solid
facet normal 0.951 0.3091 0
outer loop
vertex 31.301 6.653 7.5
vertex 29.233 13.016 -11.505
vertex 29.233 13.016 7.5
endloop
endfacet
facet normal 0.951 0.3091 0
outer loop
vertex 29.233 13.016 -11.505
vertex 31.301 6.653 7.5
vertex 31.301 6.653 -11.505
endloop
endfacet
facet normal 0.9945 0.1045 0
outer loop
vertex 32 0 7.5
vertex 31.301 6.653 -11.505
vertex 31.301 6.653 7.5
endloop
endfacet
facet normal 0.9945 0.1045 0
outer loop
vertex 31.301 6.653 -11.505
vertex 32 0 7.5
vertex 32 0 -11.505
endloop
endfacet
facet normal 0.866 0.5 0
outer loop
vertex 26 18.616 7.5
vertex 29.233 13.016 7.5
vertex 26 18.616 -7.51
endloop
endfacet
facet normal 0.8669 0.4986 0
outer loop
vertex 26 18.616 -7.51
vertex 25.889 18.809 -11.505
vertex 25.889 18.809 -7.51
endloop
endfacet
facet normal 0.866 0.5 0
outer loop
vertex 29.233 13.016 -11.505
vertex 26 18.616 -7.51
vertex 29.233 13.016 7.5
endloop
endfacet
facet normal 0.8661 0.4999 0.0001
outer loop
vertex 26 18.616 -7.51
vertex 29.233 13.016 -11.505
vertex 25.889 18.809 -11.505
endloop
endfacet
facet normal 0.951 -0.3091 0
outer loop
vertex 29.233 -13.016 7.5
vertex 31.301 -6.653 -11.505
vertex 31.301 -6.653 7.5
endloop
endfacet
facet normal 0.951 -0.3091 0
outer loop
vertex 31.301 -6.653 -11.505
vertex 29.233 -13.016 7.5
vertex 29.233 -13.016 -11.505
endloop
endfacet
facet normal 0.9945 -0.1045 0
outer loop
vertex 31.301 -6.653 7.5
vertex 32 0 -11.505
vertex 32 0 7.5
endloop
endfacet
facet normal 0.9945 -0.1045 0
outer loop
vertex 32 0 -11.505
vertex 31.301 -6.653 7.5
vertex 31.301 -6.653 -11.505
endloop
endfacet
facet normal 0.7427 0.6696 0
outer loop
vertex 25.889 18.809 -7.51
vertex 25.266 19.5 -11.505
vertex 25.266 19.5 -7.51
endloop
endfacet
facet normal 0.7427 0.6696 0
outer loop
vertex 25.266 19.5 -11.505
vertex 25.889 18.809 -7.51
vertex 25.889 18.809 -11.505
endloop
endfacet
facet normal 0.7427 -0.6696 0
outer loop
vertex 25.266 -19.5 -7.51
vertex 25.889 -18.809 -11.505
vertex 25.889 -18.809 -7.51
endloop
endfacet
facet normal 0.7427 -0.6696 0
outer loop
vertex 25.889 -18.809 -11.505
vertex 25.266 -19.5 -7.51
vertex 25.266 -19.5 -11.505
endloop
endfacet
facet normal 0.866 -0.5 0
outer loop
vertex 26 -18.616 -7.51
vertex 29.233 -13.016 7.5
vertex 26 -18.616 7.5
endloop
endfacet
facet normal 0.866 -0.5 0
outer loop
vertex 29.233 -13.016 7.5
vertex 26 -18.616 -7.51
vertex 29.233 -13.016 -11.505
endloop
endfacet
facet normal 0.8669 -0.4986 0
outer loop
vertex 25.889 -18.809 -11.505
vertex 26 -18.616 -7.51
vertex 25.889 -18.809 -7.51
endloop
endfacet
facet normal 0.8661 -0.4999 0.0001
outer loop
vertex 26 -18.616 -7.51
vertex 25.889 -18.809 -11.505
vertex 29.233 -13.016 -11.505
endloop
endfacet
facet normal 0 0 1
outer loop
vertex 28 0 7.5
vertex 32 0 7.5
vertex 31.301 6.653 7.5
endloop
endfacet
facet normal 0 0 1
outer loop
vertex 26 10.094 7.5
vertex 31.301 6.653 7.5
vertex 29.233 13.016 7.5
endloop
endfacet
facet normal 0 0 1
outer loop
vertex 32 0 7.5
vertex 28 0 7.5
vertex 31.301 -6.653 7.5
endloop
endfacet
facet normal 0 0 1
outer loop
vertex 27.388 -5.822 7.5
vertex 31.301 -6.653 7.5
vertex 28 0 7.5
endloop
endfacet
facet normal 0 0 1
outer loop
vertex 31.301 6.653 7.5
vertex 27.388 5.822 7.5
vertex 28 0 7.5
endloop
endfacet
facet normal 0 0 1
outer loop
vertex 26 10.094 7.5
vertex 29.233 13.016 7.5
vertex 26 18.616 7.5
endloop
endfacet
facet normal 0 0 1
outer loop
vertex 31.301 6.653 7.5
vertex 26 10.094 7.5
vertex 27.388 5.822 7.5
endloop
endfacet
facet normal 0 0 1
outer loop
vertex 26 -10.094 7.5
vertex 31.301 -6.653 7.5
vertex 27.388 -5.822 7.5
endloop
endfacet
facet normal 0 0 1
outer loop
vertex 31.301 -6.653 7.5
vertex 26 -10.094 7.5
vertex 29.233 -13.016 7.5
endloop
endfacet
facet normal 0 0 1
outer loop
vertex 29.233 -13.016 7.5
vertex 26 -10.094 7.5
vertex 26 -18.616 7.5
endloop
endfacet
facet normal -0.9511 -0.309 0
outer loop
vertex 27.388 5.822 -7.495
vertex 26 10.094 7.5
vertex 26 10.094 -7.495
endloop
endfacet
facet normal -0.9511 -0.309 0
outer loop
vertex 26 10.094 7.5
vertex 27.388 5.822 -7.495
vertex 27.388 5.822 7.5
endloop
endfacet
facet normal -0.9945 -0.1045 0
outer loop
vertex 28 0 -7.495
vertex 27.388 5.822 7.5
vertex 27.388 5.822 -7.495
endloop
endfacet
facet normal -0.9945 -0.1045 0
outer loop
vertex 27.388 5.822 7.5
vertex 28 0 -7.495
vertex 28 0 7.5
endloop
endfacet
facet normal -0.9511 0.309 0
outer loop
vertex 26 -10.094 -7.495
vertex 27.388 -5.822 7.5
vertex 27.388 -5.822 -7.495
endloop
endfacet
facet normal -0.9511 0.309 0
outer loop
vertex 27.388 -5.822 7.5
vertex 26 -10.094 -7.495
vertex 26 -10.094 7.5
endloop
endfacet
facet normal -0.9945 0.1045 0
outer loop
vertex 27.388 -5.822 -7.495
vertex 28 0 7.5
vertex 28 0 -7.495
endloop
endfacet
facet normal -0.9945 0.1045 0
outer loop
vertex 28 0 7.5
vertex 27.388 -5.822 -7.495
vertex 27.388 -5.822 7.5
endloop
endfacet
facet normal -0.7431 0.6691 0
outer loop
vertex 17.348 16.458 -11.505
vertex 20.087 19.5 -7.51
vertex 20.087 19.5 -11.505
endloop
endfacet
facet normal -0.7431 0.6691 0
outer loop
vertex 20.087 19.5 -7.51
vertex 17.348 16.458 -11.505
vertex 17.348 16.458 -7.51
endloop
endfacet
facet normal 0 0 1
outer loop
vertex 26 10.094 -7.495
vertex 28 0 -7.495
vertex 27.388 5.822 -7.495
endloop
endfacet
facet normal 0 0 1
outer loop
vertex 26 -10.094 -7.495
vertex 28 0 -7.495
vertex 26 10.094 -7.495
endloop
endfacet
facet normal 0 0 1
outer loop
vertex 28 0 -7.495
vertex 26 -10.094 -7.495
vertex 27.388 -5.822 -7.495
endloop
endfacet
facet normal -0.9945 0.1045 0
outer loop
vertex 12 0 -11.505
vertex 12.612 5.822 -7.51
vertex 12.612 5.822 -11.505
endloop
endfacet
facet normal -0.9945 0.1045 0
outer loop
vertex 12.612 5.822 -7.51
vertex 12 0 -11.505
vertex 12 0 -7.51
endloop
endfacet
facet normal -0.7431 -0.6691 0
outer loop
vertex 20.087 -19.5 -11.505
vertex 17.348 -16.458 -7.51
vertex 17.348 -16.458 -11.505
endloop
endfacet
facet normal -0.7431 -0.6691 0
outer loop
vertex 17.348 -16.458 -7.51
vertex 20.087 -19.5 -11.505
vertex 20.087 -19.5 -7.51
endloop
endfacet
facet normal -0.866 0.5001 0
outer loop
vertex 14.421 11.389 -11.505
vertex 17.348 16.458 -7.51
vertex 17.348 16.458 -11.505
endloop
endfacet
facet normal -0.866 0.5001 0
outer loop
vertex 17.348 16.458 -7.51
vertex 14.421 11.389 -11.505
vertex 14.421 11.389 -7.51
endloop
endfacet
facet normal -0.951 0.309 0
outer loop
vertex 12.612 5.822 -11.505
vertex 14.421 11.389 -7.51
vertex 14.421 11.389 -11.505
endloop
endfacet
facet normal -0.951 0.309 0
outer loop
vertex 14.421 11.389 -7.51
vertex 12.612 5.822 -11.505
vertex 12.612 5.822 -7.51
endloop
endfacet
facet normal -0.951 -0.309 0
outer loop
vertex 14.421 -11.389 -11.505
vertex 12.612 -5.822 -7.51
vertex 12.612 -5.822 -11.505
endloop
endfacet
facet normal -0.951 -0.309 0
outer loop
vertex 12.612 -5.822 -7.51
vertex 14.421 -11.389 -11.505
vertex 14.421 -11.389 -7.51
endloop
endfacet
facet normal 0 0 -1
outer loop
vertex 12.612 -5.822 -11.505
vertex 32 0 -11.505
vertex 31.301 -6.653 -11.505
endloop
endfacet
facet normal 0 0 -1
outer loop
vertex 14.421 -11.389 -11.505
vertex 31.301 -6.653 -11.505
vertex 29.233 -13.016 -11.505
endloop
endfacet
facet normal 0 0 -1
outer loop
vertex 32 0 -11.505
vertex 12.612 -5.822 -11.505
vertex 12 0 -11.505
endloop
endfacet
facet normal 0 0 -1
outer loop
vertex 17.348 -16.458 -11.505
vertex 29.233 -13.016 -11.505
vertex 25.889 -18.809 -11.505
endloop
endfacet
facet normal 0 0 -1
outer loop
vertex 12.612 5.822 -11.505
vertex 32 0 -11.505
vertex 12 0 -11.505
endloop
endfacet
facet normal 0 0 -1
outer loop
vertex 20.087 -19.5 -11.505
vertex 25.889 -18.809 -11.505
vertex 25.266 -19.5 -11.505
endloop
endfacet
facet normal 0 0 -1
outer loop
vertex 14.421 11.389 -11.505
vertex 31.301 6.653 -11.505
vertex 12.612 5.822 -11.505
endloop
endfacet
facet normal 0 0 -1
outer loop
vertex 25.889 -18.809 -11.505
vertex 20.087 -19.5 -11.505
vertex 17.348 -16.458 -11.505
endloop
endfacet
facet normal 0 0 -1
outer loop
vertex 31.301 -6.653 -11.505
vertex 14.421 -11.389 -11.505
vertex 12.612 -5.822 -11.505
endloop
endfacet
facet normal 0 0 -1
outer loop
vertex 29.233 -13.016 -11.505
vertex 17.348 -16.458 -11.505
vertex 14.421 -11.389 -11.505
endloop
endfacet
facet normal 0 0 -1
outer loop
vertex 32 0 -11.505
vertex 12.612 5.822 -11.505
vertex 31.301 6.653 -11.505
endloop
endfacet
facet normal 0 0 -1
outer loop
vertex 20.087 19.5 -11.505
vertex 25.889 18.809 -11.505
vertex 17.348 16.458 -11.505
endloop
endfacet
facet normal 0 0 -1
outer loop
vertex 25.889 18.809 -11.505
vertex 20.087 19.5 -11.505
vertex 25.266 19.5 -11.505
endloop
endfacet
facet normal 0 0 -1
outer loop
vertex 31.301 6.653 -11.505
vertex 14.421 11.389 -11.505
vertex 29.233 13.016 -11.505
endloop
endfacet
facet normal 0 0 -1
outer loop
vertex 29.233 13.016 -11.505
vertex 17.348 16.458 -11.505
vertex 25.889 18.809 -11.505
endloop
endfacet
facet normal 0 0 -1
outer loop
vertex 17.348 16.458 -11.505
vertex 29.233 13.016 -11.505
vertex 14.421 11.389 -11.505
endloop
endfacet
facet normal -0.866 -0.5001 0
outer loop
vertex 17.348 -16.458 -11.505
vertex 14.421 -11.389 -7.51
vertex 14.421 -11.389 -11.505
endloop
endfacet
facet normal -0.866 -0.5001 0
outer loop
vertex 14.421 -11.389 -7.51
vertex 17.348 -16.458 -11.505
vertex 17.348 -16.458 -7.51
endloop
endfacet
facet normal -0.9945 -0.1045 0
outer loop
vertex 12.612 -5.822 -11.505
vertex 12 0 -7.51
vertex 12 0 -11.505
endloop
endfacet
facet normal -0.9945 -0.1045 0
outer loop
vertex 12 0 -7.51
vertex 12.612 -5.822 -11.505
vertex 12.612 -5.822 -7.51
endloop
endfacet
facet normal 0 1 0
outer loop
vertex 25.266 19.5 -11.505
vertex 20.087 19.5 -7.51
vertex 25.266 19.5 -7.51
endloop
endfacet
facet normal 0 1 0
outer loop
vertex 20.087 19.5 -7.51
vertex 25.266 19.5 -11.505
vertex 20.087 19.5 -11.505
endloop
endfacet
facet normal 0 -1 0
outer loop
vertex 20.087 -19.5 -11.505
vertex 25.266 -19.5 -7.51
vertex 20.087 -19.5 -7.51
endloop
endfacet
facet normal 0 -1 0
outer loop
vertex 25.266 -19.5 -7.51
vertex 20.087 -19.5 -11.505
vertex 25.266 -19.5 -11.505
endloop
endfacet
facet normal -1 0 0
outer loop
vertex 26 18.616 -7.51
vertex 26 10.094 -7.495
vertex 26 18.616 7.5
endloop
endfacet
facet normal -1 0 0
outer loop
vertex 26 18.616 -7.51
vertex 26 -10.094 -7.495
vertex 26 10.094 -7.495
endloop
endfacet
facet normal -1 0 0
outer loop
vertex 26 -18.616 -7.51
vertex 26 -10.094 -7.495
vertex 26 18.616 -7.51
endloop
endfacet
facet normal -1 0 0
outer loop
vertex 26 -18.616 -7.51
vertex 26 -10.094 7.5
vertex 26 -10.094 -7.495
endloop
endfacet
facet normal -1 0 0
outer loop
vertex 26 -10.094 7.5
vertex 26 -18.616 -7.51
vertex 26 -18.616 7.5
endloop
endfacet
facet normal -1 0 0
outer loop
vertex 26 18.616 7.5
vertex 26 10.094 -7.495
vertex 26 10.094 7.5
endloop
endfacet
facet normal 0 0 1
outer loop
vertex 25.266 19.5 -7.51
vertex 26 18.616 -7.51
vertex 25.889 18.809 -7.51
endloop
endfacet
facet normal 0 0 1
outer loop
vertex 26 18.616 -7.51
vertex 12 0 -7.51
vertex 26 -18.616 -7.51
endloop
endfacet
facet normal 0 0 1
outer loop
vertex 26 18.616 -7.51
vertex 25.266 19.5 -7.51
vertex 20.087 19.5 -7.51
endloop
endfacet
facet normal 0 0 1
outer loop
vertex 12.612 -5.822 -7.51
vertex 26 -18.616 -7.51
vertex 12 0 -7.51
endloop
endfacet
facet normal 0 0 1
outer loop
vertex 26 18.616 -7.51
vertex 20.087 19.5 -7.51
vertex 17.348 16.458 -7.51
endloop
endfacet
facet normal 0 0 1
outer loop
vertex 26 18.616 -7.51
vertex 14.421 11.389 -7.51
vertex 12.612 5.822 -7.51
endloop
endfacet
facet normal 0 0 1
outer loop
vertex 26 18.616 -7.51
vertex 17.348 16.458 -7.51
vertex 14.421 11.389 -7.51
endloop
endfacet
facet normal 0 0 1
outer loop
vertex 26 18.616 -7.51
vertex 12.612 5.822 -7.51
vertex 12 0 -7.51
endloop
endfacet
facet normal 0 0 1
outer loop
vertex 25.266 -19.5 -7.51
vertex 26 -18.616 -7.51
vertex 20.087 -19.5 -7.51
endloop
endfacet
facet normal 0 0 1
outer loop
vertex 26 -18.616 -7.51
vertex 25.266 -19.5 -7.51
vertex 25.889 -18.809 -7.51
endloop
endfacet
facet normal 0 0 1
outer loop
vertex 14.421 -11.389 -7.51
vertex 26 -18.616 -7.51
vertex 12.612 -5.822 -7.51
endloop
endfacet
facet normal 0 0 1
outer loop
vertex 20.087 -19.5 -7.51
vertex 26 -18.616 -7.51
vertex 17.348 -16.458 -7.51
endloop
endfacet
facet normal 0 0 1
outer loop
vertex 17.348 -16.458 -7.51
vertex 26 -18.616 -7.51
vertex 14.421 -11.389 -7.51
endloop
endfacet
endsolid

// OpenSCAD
epsilon=0.01;
t=4;
w=15;
l=35;
d=60;

difference() {
    union() {
        difference() {
            cylinder(d=d+t, h=w, center=true);
            cylinder(d=d-t, h=w+epsilon, center=true);
            }             
        intersection() {
            translate([d*2/3,0,-(w+t)/2])
                cylinder(d=d-t, h=t+epsilon, center=true);
            translate([0,0,-(w+t)/2])
                cylinder(d=d+t, h=t+epsilon, center=true);
            translate([22,0,-(w+t)/2])
                cube([20,l+t,t+epsilon], center=true);
        }
    }
    translate([-4,0,0])
        cube([d,d+t,w+epsilon*2], center=true);
}
